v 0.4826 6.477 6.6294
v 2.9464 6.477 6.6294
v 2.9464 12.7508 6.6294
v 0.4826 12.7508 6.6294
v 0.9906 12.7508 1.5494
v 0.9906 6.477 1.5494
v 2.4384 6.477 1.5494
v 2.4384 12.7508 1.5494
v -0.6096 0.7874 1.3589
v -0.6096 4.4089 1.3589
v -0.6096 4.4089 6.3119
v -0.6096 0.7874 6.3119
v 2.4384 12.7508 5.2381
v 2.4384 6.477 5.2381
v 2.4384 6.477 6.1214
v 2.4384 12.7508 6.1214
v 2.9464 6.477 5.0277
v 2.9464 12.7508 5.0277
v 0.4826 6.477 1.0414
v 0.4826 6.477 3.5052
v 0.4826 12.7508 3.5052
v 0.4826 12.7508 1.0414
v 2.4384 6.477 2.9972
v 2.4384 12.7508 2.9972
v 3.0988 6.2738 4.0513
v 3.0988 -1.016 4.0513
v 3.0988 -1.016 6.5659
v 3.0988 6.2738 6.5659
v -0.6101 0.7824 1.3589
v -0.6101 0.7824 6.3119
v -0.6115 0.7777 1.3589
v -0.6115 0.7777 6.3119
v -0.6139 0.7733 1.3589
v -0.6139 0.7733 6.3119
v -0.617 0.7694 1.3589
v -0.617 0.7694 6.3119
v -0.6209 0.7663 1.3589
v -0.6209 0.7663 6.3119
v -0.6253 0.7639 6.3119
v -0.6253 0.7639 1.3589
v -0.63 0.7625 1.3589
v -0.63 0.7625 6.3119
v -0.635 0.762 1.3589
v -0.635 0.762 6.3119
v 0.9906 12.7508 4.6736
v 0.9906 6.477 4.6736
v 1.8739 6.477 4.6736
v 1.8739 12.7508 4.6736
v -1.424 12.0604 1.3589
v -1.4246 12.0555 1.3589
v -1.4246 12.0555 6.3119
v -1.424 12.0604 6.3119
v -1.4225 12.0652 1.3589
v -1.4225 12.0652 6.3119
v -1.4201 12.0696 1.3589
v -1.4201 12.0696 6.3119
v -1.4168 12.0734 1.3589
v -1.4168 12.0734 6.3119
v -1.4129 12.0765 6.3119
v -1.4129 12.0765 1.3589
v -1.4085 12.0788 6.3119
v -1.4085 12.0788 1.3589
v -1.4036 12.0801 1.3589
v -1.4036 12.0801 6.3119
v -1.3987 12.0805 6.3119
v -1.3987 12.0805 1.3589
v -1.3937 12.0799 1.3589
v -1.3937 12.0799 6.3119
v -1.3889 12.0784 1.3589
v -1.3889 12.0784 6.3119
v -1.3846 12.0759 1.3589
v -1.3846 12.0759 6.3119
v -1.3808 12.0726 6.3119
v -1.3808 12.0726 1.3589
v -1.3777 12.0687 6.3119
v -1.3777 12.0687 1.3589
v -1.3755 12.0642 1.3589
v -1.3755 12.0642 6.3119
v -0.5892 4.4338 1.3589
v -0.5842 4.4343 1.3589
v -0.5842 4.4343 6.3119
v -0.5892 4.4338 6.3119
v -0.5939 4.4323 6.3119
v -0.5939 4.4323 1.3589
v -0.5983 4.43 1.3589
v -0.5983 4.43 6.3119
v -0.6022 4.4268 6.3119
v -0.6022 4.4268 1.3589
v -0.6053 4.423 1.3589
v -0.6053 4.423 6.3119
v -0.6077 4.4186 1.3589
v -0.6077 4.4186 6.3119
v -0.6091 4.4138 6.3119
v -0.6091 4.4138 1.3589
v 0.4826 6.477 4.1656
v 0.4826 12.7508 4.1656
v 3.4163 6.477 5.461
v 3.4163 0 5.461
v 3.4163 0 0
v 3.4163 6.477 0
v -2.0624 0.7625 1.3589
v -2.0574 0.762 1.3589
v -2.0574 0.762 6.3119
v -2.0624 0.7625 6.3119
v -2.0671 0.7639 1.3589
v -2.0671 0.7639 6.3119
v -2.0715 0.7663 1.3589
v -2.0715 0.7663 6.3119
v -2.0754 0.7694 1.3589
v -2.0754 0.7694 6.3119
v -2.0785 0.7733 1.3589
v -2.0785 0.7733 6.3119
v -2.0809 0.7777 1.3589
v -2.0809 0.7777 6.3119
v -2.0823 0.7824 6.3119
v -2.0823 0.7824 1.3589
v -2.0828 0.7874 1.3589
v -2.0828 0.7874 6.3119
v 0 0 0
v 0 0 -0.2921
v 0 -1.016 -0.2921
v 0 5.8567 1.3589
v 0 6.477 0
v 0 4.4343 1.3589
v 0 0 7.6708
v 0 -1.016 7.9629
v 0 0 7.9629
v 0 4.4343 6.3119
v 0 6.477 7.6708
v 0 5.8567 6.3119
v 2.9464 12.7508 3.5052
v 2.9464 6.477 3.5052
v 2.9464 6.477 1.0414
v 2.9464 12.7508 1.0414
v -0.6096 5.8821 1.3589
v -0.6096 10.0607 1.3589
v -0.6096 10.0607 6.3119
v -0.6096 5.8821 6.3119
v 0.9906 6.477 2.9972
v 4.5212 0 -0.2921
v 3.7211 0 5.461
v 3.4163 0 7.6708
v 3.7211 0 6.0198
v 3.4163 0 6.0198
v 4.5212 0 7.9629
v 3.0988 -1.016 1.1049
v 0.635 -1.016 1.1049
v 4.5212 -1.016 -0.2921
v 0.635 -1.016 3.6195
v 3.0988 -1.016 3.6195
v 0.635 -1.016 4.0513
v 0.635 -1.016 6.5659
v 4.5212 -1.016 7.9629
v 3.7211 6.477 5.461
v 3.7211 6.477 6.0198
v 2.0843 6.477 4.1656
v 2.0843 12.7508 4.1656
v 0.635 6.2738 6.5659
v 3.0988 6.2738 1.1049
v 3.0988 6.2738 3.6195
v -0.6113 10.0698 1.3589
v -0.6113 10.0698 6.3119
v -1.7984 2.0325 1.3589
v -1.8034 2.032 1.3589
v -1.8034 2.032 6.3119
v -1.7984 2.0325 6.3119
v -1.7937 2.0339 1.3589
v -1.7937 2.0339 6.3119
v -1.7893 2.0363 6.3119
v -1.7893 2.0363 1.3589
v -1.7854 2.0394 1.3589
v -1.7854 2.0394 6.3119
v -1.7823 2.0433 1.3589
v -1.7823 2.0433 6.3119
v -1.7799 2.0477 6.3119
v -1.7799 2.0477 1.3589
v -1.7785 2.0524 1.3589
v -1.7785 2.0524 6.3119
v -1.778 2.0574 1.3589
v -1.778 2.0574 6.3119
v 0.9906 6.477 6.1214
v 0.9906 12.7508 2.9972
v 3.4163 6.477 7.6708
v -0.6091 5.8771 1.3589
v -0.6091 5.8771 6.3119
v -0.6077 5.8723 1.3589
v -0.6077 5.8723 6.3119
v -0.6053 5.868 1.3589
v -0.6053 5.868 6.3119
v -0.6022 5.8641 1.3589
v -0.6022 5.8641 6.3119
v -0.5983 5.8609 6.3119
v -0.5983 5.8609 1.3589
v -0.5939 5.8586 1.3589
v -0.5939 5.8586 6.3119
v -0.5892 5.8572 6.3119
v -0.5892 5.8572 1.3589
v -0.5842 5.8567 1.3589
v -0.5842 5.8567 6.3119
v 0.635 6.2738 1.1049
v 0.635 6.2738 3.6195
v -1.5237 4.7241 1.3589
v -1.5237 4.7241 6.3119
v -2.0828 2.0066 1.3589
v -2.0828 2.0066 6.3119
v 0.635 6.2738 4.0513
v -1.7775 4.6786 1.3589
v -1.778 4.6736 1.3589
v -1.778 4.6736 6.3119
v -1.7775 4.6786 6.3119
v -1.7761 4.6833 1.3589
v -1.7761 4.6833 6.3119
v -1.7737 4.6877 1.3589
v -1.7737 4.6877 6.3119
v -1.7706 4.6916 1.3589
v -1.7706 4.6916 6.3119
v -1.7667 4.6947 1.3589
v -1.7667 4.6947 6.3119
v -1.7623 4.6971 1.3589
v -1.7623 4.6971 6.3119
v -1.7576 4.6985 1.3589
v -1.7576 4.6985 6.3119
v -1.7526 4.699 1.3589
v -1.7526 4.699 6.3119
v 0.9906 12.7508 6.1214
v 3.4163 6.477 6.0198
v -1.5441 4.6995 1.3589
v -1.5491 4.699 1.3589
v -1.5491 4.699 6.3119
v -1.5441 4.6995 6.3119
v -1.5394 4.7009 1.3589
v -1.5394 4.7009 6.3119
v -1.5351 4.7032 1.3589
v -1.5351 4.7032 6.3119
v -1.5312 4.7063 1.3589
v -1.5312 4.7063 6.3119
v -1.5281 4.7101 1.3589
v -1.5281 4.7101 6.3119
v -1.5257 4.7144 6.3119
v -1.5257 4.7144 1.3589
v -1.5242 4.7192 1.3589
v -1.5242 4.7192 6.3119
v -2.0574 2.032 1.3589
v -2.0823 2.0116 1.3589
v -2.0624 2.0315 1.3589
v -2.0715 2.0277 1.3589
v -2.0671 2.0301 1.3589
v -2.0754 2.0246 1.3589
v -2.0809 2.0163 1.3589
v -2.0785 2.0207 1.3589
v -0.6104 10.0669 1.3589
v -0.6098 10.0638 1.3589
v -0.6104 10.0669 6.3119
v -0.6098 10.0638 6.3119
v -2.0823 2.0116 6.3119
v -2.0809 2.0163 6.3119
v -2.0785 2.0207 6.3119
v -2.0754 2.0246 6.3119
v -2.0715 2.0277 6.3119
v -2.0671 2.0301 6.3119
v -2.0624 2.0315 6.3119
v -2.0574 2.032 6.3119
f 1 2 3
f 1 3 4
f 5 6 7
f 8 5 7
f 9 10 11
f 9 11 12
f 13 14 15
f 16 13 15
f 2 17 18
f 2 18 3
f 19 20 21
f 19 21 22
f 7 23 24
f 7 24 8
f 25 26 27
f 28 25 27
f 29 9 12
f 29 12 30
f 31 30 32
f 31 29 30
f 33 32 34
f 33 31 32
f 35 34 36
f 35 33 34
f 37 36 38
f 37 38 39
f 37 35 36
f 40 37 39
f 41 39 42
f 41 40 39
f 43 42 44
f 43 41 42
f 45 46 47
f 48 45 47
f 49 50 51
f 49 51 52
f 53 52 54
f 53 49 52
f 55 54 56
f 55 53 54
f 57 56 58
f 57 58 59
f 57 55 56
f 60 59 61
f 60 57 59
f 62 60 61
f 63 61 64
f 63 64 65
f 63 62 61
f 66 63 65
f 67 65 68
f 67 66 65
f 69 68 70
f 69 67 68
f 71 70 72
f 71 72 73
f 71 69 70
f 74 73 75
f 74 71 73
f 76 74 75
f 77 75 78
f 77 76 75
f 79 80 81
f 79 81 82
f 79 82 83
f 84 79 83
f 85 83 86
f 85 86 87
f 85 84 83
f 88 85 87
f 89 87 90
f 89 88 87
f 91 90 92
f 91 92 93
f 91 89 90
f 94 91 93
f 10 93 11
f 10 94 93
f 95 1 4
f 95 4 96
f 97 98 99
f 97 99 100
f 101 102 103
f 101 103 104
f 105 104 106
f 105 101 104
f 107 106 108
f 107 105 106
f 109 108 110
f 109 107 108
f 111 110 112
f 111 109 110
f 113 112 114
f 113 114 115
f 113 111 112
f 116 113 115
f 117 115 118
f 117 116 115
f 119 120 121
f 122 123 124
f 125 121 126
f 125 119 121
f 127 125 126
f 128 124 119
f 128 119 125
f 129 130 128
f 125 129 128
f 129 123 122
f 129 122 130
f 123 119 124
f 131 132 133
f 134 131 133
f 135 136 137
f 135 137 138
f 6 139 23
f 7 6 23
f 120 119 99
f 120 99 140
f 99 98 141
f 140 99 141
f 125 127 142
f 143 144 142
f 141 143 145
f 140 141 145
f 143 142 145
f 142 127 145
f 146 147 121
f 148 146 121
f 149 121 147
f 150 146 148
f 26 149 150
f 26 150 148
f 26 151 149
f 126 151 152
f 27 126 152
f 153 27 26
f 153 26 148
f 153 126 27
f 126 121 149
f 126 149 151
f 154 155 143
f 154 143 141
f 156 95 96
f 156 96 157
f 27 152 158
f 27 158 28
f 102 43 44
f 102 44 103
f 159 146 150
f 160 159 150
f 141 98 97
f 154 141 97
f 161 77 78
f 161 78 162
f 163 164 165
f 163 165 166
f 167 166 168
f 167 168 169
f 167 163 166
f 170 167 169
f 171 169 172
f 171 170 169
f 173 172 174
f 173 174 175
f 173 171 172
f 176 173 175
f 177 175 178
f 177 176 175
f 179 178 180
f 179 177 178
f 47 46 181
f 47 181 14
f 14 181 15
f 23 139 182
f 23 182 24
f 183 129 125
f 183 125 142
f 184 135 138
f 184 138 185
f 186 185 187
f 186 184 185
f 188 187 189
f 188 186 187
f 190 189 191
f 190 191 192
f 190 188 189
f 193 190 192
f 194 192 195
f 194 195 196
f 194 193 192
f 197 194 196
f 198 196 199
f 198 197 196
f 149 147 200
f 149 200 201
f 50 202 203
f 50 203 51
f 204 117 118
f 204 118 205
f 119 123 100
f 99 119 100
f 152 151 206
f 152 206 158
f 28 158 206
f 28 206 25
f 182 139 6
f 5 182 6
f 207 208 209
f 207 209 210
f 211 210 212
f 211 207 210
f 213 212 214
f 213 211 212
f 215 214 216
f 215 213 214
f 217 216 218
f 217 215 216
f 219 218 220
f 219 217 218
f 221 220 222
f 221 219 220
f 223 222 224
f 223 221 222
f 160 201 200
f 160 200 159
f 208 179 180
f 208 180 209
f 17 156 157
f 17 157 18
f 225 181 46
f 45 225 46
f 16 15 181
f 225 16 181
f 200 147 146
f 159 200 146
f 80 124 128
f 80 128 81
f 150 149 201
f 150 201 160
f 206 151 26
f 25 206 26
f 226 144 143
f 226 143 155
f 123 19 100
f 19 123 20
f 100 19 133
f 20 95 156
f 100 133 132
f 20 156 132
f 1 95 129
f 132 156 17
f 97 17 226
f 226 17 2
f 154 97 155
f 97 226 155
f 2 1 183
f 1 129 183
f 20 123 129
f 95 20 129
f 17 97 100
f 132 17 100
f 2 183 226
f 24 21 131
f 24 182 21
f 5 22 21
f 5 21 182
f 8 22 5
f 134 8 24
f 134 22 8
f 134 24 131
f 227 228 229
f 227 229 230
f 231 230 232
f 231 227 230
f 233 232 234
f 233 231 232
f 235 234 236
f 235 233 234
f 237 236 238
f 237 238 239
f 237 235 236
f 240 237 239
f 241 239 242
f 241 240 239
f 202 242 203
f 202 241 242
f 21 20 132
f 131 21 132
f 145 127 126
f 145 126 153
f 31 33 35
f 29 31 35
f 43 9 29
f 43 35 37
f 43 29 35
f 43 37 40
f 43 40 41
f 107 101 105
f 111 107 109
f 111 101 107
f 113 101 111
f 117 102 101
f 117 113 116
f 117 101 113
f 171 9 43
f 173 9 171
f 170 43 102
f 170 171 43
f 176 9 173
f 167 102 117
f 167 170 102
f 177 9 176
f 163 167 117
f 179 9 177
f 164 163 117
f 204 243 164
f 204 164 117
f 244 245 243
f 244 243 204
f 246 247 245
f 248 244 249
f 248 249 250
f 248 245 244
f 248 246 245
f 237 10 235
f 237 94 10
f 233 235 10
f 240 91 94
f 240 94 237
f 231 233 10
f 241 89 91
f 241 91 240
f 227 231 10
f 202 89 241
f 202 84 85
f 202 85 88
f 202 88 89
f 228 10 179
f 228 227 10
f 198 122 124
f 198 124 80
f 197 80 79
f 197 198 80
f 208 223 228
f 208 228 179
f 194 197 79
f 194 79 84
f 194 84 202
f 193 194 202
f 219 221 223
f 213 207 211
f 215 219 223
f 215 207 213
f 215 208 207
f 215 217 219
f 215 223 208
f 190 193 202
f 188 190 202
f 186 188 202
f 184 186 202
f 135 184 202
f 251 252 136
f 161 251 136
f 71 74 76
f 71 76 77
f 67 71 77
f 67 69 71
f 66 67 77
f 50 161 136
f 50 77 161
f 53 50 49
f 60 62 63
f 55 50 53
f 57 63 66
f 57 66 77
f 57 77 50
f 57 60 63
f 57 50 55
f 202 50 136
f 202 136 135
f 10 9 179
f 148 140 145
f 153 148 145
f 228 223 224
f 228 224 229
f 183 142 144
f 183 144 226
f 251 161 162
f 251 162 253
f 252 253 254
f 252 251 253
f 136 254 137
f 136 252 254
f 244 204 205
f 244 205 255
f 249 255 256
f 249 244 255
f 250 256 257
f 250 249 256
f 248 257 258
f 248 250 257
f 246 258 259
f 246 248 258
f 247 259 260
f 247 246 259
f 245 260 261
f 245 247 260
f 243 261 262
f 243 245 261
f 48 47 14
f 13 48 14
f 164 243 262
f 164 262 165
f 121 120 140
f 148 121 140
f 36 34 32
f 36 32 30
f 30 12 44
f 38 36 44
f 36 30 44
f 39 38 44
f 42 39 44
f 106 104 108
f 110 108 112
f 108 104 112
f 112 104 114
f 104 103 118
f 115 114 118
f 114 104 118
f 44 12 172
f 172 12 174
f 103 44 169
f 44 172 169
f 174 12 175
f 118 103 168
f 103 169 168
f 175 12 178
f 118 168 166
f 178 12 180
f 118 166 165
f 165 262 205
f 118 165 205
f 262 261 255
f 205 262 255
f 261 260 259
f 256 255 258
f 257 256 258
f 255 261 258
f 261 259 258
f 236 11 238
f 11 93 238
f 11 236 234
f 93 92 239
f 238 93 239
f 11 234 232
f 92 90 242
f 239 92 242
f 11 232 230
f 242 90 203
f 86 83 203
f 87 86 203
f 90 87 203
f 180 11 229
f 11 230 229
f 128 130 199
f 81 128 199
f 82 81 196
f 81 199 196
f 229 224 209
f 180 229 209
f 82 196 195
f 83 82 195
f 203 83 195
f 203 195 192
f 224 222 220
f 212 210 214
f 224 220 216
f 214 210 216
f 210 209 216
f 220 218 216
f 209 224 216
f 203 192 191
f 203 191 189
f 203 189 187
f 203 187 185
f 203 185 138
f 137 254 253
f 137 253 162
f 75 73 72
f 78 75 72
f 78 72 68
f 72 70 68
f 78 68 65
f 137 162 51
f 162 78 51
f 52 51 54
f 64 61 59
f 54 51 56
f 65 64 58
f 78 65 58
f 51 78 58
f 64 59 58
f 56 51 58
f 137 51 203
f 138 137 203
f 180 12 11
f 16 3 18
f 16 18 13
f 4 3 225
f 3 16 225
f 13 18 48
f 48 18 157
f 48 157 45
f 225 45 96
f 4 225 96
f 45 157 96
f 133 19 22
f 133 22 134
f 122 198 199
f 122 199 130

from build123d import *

# Parameters (mm, degrees)
SKETCH1_W           = 3.4163
SKETCH1_H           = 6.477
EXTRUDE1_DEPTH      = 3.8354
SKETCH2_W           = 0.5588
SKETCH2_H           = 6.477
EXTRUDE2_DEPTH      = 0.3048
SKETCH3_W           = 4.5212
SKETCH3_H           = 8.255
EXTRUDE3_DEPTH      = 1.016
SKETCH4_W           = 2.4638
SKETCH4_H           = 2.4638
SKETCH4_W_2         = 1.4478
SKETCH4_H_2         = 1.4478
EXTRUDE4_DEPTH      = 6.2738
SKETCH5_W           = 2.4638
SKETCH5_H           = 2.5146
EXTRUDE5_DEPTH      = 7.2898
EXTRUDE6_DEPTH      = 2.4765
EXTRUDE6_DEPTH_BACK = 2.4765


with BuildPart() as part:
    # Sketch1 → Extrude1 (new body)
    with BuildSketch(Plane.XY):
        with Locations((1.70815, 3.2385)):
            Rectangle(SKETCH1_W, SKETCH1_H)
    extrude1 = extrude(amount=EXTRUDE1_DEPTH)

    # Mirror1: Extrude1 across plane
    add(extrude1.mirror(Plane.XY.offset(3.8354)))

    # Sketch2 → Extrude2 (add)
    with BuildSketch(Plane(origin=(3.4163, 0, 0), x_dir=(0, 0, -1), z_dir=(1, 0, 0))):
        with Locations((-5.7404, 3.2385)):
            Rectangle(SKETCH2_W, SKETCH2_H)
    extrude(amount=EXTRUDE2_DEPTH)

    # Sketch3 → Extrude3 (add)
    with BuildSketch(Plane.XZ):
        with Locations((2.2606, 3.8354)):
            Rectangle(SKETCH3_W, SKETCH3_H)
    extrude(amount=EXTRUDE3_DEPTH)

    # Sketch4 → Extrude4 (add)
    # profile 1 of 2: a face of its own
    with BuildSketch(Plane(origin=(0, 6.477, 0), x_dir=(1, 0, 0), z_dir=(0, 1, 0))):
        Polygon((2.9464, -6.6294), (0.4826, -6.6294), (0.4826, -4.1656), (2.084295412, -4.1656), (2.9464, -5.027704588), align=None)
        Polygon((0.9906, -6.1214), (0.9906, -4.6736), (1.873874923, -4.6736), (2.4384, -5.238125077), (2.4384, -6.1214), align=None, mode=Mode.SUBTRACT)
    # profile 2 of 2: a face of its own
    with BuildSketch(Plane(origin=(0, 6.477, 0), x_dir=(1, 0, 0), z_dir=(0, 1, 0))):
        with Locations((1.7145, -2.2733)):
            Rectangle(SKETCH4_W, SKETCH4_H)
        with Locations((1.7145, -2.2733)):
            Rectangle(SKETCH4_W_2, SKETCH4_H_2, mode=Mode.SUBTRACT)
    extrude(amount=EXTRUDE4_DEPTH)

    # Sketch5 → Extrude5 (cut)
    with BuildSketch(Plane.XZ.offset(1.016)):
        with Locations((1.8669, 5.3086)):
            Rectangle(SKETCH5_W, SKETCH5_H)
        with Locations((1.8669, 2.3622)):
            Rectangle(SKETCH5_W, SKETCH5_H)
    extrude(amount=-EXTRUDE5_DEPTH, mode=Mode.SUBTRACT)

    # Sketch6 → Extrude6 (add, two sides: drawn at the far end of the back side and taken through both)
    with BuildSketch(Plane.XY.offset(3.8354).offset(-EXTRUDE6_DEPTH_BACK)):
        with BuildLine():
            ThreePointArc((-0.6096, 0.7874), (-0.617039488, 0.769439488), (-0.635, 0.762))
            Line((-0.635, 0.762), (-2.0574, 0.762))
            ThreePointArc((-2.0574, 0.762), (-2.075360512, 0.769439488), (-2.0828, 0.7874))
            Line((-2.0828, 0.7874), (-2.0828, 2.0066))
            ThreePointArc((-2.0828, 2.0066), (-2.075360512, 2.024560512), (-2.0574, 2.032))
            Line((-2.0574, 2.032), (-1.8034, 2.032))
            ThreePointArc((-1.8034, 2.032), (-1.785439488, 2.039439488), (-1.778, 2.0574))
            Line((-1.778, 2.0574), (-1.778, 4.6736))
            ThreePointArc((-1.778, 4.6736), (-1.770560512, 4.691560512), (-1.7526, 4.699))
            Line((-1.7526, 4.699), (-1.549059076, 4.699))
            ThreePointArc((-1.549059076, 4.699), (-1.53122032, 4.706318551), (-1.523661395, 4.724056788))
            Line((-1.523661395, 4.724056788), (-1.424588234, 12.055470697))
            ThreePointArc((-1.424588234, 12.055470697), (-1.403642896, 12.080134217), (-1.375472083, 12.06421562))
            Line((-1.375472083, 12.06421562), (-0.61128153, 10.069809609))
            ThreePointArc((-0.61128153, 10.069809609), (-0.61002392, 10.065342668), (-0.6096, 10.060721474))
            Line((-0.6096, 10.060721474), (-0.6096, 5.882065653))
            ThreePointArc((-0.6096, 5.882065653), (-0.602160512, 5.864105141), (-0.5842, 5.856665653))
            Line((-0.5842, 5.856665653), (0, 5.856665653))
            Line((0, 5.856665653), (0, 4.434265653))
            Line((0, 4.434265653), (-0.5842, 4.434265653))
            ThreePointArc((-0.5842, 4.434265653), (-0.602160512, 4.426826165), (-0.6096, 4.408865653))
            Line((-0.6096, 4.408865653), (-0.6096, 0.7874))
        make_face()
    extrude(amount=EXTRUDE6_DEPTH + EXTRUDE6_DEPTH_BACK)


solid = part.part
